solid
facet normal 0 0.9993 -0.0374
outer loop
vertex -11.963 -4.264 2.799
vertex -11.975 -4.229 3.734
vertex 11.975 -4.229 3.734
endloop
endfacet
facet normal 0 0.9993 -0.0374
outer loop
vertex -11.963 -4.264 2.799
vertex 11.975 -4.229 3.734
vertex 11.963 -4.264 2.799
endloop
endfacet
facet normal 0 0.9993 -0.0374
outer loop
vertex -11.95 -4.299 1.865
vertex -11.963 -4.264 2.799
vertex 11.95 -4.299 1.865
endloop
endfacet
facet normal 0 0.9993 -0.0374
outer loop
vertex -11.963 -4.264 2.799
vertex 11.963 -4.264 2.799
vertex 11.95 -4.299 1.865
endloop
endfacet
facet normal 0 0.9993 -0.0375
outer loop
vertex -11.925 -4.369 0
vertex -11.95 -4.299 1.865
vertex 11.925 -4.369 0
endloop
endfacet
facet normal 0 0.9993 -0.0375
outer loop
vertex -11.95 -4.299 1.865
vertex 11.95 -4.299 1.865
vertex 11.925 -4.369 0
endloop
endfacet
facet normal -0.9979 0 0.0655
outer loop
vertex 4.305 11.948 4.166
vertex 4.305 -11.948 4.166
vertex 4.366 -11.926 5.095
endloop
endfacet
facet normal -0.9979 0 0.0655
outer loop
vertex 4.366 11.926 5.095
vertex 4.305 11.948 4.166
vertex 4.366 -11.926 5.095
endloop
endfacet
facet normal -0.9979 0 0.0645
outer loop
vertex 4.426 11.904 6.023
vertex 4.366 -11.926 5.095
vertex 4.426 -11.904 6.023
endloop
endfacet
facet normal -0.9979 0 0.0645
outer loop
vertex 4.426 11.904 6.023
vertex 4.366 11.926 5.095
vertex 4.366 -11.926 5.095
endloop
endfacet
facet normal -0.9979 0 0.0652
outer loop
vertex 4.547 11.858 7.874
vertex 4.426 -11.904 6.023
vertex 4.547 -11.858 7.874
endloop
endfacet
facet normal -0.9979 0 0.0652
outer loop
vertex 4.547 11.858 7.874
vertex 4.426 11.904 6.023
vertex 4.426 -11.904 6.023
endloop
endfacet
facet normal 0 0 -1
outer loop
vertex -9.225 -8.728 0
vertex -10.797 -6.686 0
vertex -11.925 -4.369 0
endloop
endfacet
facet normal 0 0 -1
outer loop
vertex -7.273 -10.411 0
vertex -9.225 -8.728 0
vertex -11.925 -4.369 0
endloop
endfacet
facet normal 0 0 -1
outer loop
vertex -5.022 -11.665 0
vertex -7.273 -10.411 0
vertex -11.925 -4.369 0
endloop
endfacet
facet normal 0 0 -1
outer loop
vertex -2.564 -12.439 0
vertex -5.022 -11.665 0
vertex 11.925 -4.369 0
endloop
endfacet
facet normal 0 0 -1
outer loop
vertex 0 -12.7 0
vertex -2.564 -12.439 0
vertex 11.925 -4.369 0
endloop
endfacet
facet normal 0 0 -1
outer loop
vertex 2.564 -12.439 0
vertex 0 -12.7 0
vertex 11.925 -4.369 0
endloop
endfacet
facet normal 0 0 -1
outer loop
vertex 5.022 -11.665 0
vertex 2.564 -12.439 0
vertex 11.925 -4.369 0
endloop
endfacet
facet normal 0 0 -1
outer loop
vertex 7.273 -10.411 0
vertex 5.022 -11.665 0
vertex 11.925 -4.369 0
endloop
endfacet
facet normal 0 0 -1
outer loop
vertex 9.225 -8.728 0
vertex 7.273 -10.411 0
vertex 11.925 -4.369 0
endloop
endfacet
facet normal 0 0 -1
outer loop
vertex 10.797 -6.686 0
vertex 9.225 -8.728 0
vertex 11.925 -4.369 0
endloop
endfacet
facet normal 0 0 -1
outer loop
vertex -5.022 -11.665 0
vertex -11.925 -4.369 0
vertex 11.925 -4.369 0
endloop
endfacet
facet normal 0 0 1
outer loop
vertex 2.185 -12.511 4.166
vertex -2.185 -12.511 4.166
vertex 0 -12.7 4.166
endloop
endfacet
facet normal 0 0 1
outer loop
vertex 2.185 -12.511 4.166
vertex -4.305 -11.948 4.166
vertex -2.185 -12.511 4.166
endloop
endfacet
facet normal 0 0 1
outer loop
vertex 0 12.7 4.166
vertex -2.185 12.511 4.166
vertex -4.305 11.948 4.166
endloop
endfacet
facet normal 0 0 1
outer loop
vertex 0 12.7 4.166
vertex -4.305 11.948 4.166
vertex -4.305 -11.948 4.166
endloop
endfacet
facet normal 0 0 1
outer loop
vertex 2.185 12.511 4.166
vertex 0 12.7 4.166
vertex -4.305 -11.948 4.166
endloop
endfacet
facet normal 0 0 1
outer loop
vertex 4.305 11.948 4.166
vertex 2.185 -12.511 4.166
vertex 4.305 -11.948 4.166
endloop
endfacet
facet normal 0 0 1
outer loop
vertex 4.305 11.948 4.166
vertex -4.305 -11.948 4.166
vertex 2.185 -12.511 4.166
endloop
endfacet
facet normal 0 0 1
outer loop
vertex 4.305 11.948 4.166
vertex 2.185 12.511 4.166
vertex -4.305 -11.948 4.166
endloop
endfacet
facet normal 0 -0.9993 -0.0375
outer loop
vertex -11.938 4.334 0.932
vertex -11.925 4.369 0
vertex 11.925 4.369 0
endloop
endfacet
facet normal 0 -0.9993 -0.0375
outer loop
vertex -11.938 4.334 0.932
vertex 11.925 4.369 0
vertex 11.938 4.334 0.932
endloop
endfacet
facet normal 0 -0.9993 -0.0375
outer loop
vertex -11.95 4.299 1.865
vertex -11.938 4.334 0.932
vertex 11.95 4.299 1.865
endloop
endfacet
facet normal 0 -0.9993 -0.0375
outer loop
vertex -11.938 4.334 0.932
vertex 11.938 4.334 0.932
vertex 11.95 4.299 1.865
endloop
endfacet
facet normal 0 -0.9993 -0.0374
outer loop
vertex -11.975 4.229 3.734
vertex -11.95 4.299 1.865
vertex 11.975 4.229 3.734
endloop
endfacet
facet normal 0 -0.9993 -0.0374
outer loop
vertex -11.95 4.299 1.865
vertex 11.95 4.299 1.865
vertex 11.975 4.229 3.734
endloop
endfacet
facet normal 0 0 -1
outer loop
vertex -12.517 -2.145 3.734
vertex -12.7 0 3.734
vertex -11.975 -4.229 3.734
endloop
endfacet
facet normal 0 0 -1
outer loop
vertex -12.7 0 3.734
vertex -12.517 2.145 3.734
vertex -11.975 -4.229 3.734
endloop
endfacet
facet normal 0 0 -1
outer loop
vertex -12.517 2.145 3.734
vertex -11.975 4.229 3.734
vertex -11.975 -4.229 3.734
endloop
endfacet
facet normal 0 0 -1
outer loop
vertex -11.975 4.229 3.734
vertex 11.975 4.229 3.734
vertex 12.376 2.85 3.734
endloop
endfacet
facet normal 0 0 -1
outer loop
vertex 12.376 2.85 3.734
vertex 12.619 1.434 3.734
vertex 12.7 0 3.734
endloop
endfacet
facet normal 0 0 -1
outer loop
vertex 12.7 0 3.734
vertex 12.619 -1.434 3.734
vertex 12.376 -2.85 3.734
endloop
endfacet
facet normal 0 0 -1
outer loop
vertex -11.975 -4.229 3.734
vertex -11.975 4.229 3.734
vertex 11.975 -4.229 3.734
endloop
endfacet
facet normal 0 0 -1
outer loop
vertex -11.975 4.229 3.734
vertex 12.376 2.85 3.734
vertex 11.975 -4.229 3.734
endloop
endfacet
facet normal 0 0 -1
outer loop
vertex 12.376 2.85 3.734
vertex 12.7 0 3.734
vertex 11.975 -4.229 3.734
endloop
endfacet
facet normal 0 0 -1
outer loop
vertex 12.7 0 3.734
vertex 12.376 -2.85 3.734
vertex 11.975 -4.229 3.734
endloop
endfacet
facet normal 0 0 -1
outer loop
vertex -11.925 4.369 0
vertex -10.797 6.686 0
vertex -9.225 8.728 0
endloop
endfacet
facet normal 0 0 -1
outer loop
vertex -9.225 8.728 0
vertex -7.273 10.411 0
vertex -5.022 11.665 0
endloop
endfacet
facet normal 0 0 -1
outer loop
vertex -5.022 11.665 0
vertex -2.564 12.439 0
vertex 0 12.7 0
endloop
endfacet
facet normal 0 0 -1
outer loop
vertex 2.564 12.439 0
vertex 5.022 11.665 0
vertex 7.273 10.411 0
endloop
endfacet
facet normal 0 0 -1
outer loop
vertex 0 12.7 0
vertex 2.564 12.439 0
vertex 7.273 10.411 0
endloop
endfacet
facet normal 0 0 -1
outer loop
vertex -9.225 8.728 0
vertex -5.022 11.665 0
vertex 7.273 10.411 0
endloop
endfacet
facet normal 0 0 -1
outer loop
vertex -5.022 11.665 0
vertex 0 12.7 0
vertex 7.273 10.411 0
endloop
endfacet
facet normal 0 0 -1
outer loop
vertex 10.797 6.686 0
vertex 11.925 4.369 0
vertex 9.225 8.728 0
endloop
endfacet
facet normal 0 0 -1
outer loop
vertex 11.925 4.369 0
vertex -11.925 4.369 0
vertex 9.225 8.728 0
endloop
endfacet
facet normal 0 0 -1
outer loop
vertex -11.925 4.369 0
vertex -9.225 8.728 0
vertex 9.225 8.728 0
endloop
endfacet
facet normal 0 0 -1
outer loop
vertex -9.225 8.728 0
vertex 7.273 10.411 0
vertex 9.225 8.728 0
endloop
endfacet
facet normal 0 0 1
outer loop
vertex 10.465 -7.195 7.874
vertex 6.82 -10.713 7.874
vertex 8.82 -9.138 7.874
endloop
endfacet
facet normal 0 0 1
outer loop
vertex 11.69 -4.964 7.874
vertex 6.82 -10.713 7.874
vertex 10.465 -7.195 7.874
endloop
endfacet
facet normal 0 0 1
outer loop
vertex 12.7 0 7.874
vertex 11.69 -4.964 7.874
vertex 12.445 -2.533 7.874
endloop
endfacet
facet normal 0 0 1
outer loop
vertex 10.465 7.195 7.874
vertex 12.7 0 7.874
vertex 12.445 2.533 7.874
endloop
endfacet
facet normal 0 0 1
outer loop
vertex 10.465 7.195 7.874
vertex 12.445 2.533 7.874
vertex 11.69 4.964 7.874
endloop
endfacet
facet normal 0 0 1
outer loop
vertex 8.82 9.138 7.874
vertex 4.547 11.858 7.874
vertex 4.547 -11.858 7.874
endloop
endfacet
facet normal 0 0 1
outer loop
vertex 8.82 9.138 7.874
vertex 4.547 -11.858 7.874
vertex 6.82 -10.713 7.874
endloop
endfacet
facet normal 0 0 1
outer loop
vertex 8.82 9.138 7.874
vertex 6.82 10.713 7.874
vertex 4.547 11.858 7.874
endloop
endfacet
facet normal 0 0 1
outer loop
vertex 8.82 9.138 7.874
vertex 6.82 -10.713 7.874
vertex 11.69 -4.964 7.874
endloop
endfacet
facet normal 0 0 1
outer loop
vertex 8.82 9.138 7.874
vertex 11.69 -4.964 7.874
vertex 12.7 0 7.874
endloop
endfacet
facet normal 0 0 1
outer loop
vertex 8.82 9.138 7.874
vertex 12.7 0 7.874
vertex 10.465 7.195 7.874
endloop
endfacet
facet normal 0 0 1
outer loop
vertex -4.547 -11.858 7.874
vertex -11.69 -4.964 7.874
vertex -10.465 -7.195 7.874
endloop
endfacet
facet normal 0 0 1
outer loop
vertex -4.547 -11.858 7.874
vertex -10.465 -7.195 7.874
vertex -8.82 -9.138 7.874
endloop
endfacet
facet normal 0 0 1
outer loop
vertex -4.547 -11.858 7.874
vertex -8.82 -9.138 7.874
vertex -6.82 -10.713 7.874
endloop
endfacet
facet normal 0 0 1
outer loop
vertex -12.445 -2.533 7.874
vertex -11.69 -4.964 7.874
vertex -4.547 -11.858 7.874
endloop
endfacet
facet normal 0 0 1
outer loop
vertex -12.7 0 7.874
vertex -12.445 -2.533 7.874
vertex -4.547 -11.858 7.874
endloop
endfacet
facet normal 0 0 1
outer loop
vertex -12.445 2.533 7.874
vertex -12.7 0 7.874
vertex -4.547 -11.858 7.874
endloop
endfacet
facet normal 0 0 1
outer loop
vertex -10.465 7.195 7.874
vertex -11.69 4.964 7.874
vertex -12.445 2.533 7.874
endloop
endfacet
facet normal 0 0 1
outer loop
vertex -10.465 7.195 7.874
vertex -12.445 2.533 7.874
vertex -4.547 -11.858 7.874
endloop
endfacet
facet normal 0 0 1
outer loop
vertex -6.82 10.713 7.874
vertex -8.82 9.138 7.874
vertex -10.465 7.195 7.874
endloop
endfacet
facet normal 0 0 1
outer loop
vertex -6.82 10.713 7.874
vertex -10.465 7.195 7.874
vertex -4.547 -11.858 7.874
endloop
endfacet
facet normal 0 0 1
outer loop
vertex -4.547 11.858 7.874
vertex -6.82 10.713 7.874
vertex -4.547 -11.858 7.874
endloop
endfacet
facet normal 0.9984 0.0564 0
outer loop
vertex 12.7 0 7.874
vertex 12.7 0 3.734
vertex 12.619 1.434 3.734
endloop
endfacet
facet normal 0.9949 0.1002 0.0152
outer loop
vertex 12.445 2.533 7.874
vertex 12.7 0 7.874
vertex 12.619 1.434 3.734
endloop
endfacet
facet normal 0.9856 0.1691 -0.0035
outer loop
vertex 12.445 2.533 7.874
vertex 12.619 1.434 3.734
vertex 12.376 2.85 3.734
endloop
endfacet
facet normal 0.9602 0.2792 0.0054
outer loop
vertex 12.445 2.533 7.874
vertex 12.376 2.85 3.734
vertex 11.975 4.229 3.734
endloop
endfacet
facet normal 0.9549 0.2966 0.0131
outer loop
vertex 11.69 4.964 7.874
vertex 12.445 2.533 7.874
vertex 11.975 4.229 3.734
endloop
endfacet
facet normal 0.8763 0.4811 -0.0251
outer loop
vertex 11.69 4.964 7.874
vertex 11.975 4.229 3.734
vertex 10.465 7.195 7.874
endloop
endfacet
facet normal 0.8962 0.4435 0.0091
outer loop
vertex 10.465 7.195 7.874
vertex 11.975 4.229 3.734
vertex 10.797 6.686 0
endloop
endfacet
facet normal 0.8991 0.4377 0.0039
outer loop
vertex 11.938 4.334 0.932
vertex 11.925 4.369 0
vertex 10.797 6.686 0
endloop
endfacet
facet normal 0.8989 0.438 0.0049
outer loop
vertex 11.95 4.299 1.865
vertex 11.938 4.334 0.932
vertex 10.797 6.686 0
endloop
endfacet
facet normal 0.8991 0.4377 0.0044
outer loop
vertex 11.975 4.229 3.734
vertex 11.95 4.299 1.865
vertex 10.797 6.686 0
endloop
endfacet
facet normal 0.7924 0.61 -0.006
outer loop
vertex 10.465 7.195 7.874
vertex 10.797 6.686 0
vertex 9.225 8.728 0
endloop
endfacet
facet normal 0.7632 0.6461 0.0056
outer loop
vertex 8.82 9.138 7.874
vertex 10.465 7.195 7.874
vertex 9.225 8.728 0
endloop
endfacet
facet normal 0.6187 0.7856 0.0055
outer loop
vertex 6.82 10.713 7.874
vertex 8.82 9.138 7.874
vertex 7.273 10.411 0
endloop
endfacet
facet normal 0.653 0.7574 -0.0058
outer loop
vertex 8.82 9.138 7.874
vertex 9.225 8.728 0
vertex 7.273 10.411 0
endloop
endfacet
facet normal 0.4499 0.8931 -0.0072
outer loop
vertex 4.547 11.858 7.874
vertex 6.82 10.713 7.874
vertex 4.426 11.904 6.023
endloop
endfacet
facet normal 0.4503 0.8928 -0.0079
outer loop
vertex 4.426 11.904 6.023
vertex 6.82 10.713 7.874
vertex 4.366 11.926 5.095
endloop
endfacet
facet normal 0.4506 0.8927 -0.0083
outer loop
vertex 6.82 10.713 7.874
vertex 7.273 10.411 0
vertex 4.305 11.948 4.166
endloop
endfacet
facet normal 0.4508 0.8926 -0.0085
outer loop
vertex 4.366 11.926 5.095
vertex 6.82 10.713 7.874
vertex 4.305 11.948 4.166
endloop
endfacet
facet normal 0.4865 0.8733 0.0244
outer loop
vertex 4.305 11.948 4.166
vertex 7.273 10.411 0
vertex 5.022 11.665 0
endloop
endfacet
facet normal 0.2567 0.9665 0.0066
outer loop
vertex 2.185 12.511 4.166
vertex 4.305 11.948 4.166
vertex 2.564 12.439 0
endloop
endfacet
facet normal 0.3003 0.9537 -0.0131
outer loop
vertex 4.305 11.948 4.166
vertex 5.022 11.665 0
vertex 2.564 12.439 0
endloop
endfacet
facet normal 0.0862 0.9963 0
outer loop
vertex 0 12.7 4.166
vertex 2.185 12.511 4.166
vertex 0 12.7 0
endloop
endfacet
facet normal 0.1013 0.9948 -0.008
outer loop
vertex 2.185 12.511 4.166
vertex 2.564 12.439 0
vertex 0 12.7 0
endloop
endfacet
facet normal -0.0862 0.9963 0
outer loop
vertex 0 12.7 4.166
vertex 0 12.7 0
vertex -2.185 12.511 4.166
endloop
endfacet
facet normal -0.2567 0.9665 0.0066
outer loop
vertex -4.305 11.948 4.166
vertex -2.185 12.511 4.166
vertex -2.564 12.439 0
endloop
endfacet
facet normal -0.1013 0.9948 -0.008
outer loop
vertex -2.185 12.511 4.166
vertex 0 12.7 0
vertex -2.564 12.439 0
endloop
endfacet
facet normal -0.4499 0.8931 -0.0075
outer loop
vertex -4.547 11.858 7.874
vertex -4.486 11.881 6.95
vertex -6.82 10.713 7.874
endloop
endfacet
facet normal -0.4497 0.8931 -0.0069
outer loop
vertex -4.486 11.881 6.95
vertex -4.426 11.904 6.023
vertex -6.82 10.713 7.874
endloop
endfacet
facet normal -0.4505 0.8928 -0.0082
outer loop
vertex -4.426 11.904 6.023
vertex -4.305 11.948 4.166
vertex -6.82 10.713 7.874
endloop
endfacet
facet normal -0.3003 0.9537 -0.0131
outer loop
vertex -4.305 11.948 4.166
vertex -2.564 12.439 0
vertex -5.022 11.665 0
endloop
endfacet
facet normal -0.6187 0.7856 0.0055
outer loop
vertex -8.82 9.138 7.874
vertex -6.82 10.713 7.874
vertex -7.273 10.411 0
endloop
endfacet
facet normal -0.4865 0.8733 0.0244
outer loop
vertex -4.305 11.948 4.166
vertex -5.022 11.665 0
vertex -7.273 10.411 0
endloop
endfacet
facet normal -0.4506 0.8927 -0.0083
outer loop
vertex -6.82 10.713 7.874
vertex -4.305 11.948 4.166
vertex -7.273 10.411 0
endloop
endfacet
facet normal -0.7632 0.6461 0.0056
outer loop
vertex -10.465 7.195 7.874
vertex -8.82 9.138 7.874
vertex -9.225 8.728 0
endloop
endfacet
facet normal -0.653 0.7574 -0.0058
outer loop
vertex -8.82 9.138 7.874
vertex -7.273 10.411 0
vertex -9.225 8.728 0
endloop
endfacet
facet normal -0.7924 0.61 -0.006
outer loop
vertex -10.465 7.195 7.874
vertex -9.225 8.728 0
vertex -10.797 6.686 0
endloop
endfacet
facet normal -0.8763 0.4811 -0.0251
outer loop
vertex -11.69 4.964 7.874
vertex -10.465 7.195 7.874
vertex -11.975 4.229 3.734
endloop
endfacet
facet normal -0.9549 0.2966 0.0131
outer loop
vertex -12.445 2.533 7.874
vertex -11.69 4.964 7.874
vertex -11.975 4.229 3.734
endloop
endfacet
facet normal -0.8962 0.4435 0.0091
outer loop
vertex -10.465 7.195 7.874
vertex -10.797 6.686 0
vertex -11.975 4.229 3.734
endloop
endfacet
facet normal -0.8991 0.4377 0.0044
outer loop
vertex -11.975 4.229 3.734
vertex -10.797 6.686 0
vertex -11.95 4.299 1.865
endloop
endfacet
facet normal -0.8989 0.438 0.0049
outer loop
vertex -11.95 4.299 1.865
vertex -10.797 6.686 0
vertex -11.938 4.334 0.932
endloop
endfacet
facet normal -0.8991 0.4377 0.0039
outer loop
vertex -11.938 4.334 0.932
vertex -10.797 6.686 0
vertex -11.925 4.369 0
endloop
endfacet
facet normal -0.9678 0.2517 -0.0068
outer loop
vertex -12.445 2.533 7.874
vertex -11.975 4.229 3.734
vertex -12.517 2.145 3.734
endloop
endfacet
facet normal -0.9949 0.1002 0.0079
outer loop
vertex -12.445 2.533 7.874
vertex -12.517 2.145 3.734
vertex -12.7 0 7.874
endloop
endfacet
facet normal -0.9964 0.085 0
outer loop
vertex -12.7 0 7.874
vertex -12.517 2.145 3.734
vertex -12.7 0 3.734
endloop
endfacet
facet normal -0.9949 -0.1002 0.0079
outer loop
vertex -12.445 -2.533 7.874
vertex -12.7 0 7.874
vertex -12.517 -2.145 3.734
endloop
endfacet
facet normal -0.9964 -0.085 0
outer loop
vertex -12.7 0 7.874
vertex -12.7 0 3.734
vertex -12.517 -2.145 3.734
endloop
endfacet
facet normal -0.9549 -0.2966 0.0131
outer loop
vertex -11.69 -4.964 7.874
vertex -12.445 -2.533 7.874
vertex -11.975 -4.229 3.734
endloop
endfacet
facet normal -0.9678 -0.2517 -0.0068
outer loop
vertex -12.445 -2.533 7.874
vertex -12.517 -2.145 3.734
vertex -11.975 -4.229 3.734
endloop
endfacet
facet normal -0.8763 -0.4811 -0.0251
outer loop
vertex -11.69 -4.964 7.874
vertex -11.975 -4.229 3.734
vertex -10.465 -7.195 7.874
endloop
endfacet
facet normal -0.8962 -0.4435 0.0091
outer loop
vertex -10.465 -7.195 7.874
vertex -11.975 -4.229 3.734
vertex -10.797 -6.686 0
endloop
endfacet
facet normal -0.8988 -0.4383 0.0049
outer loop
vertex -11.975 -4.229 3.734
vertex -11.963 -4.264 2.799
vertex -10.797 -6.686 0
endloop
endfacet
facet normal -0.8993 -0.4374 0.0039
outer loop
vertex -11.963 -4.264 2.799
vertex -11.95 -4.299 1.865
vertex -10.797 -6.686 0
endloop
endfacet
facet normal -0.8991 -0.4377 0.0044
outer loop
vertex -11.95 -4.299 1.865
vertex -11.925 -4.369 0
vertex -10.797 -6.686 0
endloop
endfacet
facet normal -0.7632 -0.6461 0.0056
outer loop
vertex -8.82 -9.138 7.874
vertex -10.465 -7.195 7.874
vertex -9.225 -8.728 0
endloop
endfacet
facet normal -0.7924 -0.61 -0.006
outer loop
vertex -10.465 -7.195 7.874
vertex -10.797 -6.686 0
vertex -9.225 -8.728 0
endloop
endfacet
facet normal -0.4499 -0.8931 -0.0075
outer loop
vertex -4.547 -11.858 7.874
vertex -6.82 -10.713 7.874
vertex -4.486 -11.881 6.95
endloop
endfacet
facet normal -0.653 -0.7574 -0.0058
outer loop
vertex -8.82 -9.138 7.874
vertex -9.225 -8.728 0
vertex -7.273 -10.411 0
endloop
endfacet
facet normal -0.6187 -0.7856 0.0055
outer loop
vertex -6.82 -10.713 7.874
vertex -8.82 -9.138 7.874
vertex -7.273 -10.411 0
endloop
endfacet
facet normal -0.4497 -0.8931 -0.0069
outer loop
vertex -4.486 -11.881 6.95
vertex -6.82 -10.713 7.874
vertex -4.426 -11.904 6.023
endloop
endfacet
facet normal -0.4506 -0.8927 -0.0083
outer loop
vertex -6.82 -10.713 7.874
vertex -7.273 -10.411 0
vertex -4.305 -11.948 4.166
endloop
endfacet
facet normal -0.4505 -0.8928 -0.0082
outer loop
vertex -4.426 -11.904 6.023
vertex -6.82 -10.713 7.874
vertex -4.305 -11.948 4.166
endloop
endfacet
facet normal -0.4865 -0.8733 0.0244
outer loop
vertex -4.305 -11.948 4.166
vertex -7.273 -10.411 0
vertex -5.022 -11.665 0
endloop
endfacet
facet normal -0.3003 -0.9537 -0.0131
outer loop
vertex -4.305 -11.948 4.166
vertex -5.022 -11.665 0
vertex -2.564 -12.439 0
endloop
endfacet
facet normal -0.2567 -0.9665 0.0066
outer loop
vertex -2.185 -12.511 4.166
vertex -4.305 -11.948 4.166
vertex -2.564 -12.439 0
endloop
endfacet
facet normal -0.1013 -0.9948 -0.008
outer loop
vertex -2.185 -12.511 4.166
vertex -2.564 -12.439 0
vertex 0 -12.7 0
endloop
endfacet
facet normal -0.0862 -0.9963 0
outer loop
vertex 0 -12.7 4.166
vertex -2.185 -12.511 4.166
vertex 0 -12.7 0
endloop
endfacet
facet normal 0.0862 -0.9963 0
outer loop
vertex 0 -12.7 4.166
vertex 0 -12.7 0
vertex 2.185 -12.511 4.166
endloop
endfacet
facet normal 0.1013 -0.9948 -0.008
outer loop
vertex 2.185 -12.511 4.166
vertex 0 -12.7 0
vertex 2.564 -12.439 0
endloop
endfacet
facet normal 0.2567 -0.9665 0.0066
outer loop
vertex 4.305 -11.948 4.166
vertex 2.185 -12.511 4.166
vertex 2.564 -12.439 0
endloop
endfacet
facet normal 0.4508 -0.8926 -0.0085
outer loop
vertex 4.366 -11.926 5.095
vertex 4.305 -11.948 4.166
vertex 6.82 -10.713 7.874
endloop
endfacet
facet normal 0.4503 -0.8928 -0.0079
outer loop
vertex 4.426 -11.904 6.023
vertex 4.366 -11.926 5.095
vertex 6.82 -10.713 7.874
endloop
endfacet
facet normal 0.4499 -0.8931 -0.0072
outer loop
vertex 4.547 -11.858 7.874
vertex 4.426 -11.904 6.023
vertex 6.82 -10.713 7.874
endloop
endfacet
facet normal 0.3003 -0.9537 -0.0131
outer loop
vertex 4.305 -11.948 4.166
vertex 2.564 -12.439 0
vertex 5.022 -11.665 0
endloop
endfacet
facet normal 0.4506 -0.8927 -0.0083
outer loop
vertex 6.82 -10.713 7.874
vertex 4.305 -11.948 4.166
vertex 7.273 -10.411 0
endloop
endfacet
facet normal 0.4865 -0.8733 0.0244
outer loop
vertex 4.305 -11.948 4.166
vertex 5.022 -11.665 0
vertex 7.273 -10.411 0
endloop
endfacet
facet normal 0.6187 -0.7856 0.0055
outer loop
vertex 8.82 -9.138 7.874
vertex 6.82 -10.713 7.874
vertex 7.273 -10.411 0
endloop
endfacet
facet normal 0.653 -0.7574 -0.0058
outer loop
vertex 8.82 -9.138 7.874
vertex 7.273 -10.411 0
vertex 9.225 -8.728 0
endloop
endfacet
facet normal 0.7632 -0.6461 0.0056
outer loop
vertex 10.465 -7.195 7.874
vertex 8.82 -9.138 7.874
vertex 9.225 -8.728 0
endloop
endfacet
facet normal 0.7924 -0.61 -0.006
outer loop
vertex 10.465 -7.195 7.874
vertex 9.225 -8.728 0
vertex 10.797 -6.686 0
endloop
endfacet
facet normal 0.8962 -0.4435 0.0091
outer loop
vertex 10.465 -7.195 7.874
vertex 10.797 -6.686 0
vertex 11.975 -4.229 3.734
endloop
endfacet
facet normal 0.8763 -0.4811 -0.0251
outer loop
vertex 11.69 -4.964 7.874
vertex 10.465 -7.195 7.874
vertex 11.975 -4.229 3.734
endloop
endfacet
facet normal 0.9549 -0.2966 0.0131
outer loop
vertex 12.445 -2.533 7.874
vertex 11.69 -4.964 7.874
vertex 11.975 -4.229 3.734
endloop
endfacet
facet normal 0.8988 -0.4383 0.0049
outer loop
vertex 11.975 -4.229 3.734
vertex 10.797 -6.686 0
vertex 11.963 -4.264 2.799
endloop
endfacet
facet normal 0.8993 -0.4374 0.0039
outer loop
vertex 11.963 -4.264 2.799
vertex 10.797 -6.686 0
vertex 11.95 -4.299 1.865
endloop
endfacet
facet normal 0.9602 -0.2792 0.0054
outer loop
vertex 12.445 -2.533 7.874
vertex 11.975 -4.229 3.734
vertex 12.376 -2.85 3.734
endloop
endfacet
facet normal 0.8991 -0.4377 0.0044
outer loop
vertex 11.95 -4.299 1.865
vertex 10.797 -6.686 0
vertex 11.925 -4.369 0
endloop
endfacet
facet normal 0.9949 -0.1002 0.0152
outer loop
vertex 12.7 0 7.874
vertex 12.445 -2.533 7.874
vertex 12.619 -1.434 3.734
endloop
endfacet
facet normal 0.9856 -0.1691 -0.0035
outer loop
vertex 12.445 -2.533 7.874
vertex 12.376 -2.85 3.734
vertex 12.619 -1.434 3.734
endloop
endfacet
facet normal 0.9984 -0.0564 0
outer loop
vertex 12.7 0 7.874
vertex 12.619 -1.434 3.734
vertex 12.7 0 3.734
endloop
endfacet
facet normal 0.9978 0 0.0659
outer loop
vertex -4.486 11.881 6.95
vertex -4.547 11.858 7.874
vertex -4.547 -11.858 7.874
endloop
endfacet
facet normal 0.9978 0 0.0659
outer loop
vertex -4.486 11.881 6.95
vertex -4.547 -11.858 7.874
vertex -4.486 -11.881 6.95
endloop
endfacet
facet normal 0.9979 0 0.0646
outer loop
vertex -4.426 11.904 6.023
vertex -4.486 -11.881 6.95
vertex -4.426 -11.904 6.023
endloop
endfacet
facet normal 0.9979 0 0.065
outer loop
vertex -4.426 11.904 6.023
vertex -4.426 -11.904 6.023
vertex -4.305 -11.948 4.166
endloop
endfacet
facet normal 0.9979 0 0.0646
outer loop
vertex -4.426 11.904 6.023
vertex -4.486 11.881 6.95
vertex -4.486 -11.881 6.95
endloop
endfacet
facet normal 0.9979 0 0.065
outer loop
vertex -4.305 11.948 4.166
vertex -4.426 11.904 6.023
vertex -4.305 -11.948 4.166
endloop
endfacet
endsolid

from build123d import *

# Parameters (mm, degrees)
F0_R          = 12.7
F1_DEPTH      = 7.874
F3_DEPTH      = 25.4
F3_DEPTH_BACK = 25.4
F5_DEPTH      = 25.4
F5_DEPTH_BACK = 25.4


with BuildPart() as f1:
    # F0 (on Top) → F1 (new body)
    with BuildSketch(Plane.XY):
        Circle(F0_R)
    extrude(amount=F1_DEPTH)

    # F2 (on Front) → F3 (cut, two sides)
    with BuildSketch(Plane.XZ) as f3_sk:
        Polygon((4.5466, 7.874), (-4.5466, 7.874), (-4.3053, 4.1656), (4.3053, 4.1656), align=None)
    extrude(amount=-F3_DEPTH, mode=Mode.SUBTRACT)
    extrude(f3_sk.sketch, amount=F3_DEPTH_BACK, mode=Mode.SUBTRACT)

    # F4 (on Right) → F5 (cut, two sides)
    with BuildSketch(Plane.YZ) as f5_sk:
        Polygon((4.3688, 0), (4.2291, 3.7338), (-4.2291, 3.7338), (-4.3688, 0), align=None)
    extrude(amount=-F5_DEPTH, mode=Mode.SUBTRACT)
    extrude(f5_sk.sketch, amount=F5_DEPTH_BACK, mode=Mode.SUBTRACT)


solid = f1.part
